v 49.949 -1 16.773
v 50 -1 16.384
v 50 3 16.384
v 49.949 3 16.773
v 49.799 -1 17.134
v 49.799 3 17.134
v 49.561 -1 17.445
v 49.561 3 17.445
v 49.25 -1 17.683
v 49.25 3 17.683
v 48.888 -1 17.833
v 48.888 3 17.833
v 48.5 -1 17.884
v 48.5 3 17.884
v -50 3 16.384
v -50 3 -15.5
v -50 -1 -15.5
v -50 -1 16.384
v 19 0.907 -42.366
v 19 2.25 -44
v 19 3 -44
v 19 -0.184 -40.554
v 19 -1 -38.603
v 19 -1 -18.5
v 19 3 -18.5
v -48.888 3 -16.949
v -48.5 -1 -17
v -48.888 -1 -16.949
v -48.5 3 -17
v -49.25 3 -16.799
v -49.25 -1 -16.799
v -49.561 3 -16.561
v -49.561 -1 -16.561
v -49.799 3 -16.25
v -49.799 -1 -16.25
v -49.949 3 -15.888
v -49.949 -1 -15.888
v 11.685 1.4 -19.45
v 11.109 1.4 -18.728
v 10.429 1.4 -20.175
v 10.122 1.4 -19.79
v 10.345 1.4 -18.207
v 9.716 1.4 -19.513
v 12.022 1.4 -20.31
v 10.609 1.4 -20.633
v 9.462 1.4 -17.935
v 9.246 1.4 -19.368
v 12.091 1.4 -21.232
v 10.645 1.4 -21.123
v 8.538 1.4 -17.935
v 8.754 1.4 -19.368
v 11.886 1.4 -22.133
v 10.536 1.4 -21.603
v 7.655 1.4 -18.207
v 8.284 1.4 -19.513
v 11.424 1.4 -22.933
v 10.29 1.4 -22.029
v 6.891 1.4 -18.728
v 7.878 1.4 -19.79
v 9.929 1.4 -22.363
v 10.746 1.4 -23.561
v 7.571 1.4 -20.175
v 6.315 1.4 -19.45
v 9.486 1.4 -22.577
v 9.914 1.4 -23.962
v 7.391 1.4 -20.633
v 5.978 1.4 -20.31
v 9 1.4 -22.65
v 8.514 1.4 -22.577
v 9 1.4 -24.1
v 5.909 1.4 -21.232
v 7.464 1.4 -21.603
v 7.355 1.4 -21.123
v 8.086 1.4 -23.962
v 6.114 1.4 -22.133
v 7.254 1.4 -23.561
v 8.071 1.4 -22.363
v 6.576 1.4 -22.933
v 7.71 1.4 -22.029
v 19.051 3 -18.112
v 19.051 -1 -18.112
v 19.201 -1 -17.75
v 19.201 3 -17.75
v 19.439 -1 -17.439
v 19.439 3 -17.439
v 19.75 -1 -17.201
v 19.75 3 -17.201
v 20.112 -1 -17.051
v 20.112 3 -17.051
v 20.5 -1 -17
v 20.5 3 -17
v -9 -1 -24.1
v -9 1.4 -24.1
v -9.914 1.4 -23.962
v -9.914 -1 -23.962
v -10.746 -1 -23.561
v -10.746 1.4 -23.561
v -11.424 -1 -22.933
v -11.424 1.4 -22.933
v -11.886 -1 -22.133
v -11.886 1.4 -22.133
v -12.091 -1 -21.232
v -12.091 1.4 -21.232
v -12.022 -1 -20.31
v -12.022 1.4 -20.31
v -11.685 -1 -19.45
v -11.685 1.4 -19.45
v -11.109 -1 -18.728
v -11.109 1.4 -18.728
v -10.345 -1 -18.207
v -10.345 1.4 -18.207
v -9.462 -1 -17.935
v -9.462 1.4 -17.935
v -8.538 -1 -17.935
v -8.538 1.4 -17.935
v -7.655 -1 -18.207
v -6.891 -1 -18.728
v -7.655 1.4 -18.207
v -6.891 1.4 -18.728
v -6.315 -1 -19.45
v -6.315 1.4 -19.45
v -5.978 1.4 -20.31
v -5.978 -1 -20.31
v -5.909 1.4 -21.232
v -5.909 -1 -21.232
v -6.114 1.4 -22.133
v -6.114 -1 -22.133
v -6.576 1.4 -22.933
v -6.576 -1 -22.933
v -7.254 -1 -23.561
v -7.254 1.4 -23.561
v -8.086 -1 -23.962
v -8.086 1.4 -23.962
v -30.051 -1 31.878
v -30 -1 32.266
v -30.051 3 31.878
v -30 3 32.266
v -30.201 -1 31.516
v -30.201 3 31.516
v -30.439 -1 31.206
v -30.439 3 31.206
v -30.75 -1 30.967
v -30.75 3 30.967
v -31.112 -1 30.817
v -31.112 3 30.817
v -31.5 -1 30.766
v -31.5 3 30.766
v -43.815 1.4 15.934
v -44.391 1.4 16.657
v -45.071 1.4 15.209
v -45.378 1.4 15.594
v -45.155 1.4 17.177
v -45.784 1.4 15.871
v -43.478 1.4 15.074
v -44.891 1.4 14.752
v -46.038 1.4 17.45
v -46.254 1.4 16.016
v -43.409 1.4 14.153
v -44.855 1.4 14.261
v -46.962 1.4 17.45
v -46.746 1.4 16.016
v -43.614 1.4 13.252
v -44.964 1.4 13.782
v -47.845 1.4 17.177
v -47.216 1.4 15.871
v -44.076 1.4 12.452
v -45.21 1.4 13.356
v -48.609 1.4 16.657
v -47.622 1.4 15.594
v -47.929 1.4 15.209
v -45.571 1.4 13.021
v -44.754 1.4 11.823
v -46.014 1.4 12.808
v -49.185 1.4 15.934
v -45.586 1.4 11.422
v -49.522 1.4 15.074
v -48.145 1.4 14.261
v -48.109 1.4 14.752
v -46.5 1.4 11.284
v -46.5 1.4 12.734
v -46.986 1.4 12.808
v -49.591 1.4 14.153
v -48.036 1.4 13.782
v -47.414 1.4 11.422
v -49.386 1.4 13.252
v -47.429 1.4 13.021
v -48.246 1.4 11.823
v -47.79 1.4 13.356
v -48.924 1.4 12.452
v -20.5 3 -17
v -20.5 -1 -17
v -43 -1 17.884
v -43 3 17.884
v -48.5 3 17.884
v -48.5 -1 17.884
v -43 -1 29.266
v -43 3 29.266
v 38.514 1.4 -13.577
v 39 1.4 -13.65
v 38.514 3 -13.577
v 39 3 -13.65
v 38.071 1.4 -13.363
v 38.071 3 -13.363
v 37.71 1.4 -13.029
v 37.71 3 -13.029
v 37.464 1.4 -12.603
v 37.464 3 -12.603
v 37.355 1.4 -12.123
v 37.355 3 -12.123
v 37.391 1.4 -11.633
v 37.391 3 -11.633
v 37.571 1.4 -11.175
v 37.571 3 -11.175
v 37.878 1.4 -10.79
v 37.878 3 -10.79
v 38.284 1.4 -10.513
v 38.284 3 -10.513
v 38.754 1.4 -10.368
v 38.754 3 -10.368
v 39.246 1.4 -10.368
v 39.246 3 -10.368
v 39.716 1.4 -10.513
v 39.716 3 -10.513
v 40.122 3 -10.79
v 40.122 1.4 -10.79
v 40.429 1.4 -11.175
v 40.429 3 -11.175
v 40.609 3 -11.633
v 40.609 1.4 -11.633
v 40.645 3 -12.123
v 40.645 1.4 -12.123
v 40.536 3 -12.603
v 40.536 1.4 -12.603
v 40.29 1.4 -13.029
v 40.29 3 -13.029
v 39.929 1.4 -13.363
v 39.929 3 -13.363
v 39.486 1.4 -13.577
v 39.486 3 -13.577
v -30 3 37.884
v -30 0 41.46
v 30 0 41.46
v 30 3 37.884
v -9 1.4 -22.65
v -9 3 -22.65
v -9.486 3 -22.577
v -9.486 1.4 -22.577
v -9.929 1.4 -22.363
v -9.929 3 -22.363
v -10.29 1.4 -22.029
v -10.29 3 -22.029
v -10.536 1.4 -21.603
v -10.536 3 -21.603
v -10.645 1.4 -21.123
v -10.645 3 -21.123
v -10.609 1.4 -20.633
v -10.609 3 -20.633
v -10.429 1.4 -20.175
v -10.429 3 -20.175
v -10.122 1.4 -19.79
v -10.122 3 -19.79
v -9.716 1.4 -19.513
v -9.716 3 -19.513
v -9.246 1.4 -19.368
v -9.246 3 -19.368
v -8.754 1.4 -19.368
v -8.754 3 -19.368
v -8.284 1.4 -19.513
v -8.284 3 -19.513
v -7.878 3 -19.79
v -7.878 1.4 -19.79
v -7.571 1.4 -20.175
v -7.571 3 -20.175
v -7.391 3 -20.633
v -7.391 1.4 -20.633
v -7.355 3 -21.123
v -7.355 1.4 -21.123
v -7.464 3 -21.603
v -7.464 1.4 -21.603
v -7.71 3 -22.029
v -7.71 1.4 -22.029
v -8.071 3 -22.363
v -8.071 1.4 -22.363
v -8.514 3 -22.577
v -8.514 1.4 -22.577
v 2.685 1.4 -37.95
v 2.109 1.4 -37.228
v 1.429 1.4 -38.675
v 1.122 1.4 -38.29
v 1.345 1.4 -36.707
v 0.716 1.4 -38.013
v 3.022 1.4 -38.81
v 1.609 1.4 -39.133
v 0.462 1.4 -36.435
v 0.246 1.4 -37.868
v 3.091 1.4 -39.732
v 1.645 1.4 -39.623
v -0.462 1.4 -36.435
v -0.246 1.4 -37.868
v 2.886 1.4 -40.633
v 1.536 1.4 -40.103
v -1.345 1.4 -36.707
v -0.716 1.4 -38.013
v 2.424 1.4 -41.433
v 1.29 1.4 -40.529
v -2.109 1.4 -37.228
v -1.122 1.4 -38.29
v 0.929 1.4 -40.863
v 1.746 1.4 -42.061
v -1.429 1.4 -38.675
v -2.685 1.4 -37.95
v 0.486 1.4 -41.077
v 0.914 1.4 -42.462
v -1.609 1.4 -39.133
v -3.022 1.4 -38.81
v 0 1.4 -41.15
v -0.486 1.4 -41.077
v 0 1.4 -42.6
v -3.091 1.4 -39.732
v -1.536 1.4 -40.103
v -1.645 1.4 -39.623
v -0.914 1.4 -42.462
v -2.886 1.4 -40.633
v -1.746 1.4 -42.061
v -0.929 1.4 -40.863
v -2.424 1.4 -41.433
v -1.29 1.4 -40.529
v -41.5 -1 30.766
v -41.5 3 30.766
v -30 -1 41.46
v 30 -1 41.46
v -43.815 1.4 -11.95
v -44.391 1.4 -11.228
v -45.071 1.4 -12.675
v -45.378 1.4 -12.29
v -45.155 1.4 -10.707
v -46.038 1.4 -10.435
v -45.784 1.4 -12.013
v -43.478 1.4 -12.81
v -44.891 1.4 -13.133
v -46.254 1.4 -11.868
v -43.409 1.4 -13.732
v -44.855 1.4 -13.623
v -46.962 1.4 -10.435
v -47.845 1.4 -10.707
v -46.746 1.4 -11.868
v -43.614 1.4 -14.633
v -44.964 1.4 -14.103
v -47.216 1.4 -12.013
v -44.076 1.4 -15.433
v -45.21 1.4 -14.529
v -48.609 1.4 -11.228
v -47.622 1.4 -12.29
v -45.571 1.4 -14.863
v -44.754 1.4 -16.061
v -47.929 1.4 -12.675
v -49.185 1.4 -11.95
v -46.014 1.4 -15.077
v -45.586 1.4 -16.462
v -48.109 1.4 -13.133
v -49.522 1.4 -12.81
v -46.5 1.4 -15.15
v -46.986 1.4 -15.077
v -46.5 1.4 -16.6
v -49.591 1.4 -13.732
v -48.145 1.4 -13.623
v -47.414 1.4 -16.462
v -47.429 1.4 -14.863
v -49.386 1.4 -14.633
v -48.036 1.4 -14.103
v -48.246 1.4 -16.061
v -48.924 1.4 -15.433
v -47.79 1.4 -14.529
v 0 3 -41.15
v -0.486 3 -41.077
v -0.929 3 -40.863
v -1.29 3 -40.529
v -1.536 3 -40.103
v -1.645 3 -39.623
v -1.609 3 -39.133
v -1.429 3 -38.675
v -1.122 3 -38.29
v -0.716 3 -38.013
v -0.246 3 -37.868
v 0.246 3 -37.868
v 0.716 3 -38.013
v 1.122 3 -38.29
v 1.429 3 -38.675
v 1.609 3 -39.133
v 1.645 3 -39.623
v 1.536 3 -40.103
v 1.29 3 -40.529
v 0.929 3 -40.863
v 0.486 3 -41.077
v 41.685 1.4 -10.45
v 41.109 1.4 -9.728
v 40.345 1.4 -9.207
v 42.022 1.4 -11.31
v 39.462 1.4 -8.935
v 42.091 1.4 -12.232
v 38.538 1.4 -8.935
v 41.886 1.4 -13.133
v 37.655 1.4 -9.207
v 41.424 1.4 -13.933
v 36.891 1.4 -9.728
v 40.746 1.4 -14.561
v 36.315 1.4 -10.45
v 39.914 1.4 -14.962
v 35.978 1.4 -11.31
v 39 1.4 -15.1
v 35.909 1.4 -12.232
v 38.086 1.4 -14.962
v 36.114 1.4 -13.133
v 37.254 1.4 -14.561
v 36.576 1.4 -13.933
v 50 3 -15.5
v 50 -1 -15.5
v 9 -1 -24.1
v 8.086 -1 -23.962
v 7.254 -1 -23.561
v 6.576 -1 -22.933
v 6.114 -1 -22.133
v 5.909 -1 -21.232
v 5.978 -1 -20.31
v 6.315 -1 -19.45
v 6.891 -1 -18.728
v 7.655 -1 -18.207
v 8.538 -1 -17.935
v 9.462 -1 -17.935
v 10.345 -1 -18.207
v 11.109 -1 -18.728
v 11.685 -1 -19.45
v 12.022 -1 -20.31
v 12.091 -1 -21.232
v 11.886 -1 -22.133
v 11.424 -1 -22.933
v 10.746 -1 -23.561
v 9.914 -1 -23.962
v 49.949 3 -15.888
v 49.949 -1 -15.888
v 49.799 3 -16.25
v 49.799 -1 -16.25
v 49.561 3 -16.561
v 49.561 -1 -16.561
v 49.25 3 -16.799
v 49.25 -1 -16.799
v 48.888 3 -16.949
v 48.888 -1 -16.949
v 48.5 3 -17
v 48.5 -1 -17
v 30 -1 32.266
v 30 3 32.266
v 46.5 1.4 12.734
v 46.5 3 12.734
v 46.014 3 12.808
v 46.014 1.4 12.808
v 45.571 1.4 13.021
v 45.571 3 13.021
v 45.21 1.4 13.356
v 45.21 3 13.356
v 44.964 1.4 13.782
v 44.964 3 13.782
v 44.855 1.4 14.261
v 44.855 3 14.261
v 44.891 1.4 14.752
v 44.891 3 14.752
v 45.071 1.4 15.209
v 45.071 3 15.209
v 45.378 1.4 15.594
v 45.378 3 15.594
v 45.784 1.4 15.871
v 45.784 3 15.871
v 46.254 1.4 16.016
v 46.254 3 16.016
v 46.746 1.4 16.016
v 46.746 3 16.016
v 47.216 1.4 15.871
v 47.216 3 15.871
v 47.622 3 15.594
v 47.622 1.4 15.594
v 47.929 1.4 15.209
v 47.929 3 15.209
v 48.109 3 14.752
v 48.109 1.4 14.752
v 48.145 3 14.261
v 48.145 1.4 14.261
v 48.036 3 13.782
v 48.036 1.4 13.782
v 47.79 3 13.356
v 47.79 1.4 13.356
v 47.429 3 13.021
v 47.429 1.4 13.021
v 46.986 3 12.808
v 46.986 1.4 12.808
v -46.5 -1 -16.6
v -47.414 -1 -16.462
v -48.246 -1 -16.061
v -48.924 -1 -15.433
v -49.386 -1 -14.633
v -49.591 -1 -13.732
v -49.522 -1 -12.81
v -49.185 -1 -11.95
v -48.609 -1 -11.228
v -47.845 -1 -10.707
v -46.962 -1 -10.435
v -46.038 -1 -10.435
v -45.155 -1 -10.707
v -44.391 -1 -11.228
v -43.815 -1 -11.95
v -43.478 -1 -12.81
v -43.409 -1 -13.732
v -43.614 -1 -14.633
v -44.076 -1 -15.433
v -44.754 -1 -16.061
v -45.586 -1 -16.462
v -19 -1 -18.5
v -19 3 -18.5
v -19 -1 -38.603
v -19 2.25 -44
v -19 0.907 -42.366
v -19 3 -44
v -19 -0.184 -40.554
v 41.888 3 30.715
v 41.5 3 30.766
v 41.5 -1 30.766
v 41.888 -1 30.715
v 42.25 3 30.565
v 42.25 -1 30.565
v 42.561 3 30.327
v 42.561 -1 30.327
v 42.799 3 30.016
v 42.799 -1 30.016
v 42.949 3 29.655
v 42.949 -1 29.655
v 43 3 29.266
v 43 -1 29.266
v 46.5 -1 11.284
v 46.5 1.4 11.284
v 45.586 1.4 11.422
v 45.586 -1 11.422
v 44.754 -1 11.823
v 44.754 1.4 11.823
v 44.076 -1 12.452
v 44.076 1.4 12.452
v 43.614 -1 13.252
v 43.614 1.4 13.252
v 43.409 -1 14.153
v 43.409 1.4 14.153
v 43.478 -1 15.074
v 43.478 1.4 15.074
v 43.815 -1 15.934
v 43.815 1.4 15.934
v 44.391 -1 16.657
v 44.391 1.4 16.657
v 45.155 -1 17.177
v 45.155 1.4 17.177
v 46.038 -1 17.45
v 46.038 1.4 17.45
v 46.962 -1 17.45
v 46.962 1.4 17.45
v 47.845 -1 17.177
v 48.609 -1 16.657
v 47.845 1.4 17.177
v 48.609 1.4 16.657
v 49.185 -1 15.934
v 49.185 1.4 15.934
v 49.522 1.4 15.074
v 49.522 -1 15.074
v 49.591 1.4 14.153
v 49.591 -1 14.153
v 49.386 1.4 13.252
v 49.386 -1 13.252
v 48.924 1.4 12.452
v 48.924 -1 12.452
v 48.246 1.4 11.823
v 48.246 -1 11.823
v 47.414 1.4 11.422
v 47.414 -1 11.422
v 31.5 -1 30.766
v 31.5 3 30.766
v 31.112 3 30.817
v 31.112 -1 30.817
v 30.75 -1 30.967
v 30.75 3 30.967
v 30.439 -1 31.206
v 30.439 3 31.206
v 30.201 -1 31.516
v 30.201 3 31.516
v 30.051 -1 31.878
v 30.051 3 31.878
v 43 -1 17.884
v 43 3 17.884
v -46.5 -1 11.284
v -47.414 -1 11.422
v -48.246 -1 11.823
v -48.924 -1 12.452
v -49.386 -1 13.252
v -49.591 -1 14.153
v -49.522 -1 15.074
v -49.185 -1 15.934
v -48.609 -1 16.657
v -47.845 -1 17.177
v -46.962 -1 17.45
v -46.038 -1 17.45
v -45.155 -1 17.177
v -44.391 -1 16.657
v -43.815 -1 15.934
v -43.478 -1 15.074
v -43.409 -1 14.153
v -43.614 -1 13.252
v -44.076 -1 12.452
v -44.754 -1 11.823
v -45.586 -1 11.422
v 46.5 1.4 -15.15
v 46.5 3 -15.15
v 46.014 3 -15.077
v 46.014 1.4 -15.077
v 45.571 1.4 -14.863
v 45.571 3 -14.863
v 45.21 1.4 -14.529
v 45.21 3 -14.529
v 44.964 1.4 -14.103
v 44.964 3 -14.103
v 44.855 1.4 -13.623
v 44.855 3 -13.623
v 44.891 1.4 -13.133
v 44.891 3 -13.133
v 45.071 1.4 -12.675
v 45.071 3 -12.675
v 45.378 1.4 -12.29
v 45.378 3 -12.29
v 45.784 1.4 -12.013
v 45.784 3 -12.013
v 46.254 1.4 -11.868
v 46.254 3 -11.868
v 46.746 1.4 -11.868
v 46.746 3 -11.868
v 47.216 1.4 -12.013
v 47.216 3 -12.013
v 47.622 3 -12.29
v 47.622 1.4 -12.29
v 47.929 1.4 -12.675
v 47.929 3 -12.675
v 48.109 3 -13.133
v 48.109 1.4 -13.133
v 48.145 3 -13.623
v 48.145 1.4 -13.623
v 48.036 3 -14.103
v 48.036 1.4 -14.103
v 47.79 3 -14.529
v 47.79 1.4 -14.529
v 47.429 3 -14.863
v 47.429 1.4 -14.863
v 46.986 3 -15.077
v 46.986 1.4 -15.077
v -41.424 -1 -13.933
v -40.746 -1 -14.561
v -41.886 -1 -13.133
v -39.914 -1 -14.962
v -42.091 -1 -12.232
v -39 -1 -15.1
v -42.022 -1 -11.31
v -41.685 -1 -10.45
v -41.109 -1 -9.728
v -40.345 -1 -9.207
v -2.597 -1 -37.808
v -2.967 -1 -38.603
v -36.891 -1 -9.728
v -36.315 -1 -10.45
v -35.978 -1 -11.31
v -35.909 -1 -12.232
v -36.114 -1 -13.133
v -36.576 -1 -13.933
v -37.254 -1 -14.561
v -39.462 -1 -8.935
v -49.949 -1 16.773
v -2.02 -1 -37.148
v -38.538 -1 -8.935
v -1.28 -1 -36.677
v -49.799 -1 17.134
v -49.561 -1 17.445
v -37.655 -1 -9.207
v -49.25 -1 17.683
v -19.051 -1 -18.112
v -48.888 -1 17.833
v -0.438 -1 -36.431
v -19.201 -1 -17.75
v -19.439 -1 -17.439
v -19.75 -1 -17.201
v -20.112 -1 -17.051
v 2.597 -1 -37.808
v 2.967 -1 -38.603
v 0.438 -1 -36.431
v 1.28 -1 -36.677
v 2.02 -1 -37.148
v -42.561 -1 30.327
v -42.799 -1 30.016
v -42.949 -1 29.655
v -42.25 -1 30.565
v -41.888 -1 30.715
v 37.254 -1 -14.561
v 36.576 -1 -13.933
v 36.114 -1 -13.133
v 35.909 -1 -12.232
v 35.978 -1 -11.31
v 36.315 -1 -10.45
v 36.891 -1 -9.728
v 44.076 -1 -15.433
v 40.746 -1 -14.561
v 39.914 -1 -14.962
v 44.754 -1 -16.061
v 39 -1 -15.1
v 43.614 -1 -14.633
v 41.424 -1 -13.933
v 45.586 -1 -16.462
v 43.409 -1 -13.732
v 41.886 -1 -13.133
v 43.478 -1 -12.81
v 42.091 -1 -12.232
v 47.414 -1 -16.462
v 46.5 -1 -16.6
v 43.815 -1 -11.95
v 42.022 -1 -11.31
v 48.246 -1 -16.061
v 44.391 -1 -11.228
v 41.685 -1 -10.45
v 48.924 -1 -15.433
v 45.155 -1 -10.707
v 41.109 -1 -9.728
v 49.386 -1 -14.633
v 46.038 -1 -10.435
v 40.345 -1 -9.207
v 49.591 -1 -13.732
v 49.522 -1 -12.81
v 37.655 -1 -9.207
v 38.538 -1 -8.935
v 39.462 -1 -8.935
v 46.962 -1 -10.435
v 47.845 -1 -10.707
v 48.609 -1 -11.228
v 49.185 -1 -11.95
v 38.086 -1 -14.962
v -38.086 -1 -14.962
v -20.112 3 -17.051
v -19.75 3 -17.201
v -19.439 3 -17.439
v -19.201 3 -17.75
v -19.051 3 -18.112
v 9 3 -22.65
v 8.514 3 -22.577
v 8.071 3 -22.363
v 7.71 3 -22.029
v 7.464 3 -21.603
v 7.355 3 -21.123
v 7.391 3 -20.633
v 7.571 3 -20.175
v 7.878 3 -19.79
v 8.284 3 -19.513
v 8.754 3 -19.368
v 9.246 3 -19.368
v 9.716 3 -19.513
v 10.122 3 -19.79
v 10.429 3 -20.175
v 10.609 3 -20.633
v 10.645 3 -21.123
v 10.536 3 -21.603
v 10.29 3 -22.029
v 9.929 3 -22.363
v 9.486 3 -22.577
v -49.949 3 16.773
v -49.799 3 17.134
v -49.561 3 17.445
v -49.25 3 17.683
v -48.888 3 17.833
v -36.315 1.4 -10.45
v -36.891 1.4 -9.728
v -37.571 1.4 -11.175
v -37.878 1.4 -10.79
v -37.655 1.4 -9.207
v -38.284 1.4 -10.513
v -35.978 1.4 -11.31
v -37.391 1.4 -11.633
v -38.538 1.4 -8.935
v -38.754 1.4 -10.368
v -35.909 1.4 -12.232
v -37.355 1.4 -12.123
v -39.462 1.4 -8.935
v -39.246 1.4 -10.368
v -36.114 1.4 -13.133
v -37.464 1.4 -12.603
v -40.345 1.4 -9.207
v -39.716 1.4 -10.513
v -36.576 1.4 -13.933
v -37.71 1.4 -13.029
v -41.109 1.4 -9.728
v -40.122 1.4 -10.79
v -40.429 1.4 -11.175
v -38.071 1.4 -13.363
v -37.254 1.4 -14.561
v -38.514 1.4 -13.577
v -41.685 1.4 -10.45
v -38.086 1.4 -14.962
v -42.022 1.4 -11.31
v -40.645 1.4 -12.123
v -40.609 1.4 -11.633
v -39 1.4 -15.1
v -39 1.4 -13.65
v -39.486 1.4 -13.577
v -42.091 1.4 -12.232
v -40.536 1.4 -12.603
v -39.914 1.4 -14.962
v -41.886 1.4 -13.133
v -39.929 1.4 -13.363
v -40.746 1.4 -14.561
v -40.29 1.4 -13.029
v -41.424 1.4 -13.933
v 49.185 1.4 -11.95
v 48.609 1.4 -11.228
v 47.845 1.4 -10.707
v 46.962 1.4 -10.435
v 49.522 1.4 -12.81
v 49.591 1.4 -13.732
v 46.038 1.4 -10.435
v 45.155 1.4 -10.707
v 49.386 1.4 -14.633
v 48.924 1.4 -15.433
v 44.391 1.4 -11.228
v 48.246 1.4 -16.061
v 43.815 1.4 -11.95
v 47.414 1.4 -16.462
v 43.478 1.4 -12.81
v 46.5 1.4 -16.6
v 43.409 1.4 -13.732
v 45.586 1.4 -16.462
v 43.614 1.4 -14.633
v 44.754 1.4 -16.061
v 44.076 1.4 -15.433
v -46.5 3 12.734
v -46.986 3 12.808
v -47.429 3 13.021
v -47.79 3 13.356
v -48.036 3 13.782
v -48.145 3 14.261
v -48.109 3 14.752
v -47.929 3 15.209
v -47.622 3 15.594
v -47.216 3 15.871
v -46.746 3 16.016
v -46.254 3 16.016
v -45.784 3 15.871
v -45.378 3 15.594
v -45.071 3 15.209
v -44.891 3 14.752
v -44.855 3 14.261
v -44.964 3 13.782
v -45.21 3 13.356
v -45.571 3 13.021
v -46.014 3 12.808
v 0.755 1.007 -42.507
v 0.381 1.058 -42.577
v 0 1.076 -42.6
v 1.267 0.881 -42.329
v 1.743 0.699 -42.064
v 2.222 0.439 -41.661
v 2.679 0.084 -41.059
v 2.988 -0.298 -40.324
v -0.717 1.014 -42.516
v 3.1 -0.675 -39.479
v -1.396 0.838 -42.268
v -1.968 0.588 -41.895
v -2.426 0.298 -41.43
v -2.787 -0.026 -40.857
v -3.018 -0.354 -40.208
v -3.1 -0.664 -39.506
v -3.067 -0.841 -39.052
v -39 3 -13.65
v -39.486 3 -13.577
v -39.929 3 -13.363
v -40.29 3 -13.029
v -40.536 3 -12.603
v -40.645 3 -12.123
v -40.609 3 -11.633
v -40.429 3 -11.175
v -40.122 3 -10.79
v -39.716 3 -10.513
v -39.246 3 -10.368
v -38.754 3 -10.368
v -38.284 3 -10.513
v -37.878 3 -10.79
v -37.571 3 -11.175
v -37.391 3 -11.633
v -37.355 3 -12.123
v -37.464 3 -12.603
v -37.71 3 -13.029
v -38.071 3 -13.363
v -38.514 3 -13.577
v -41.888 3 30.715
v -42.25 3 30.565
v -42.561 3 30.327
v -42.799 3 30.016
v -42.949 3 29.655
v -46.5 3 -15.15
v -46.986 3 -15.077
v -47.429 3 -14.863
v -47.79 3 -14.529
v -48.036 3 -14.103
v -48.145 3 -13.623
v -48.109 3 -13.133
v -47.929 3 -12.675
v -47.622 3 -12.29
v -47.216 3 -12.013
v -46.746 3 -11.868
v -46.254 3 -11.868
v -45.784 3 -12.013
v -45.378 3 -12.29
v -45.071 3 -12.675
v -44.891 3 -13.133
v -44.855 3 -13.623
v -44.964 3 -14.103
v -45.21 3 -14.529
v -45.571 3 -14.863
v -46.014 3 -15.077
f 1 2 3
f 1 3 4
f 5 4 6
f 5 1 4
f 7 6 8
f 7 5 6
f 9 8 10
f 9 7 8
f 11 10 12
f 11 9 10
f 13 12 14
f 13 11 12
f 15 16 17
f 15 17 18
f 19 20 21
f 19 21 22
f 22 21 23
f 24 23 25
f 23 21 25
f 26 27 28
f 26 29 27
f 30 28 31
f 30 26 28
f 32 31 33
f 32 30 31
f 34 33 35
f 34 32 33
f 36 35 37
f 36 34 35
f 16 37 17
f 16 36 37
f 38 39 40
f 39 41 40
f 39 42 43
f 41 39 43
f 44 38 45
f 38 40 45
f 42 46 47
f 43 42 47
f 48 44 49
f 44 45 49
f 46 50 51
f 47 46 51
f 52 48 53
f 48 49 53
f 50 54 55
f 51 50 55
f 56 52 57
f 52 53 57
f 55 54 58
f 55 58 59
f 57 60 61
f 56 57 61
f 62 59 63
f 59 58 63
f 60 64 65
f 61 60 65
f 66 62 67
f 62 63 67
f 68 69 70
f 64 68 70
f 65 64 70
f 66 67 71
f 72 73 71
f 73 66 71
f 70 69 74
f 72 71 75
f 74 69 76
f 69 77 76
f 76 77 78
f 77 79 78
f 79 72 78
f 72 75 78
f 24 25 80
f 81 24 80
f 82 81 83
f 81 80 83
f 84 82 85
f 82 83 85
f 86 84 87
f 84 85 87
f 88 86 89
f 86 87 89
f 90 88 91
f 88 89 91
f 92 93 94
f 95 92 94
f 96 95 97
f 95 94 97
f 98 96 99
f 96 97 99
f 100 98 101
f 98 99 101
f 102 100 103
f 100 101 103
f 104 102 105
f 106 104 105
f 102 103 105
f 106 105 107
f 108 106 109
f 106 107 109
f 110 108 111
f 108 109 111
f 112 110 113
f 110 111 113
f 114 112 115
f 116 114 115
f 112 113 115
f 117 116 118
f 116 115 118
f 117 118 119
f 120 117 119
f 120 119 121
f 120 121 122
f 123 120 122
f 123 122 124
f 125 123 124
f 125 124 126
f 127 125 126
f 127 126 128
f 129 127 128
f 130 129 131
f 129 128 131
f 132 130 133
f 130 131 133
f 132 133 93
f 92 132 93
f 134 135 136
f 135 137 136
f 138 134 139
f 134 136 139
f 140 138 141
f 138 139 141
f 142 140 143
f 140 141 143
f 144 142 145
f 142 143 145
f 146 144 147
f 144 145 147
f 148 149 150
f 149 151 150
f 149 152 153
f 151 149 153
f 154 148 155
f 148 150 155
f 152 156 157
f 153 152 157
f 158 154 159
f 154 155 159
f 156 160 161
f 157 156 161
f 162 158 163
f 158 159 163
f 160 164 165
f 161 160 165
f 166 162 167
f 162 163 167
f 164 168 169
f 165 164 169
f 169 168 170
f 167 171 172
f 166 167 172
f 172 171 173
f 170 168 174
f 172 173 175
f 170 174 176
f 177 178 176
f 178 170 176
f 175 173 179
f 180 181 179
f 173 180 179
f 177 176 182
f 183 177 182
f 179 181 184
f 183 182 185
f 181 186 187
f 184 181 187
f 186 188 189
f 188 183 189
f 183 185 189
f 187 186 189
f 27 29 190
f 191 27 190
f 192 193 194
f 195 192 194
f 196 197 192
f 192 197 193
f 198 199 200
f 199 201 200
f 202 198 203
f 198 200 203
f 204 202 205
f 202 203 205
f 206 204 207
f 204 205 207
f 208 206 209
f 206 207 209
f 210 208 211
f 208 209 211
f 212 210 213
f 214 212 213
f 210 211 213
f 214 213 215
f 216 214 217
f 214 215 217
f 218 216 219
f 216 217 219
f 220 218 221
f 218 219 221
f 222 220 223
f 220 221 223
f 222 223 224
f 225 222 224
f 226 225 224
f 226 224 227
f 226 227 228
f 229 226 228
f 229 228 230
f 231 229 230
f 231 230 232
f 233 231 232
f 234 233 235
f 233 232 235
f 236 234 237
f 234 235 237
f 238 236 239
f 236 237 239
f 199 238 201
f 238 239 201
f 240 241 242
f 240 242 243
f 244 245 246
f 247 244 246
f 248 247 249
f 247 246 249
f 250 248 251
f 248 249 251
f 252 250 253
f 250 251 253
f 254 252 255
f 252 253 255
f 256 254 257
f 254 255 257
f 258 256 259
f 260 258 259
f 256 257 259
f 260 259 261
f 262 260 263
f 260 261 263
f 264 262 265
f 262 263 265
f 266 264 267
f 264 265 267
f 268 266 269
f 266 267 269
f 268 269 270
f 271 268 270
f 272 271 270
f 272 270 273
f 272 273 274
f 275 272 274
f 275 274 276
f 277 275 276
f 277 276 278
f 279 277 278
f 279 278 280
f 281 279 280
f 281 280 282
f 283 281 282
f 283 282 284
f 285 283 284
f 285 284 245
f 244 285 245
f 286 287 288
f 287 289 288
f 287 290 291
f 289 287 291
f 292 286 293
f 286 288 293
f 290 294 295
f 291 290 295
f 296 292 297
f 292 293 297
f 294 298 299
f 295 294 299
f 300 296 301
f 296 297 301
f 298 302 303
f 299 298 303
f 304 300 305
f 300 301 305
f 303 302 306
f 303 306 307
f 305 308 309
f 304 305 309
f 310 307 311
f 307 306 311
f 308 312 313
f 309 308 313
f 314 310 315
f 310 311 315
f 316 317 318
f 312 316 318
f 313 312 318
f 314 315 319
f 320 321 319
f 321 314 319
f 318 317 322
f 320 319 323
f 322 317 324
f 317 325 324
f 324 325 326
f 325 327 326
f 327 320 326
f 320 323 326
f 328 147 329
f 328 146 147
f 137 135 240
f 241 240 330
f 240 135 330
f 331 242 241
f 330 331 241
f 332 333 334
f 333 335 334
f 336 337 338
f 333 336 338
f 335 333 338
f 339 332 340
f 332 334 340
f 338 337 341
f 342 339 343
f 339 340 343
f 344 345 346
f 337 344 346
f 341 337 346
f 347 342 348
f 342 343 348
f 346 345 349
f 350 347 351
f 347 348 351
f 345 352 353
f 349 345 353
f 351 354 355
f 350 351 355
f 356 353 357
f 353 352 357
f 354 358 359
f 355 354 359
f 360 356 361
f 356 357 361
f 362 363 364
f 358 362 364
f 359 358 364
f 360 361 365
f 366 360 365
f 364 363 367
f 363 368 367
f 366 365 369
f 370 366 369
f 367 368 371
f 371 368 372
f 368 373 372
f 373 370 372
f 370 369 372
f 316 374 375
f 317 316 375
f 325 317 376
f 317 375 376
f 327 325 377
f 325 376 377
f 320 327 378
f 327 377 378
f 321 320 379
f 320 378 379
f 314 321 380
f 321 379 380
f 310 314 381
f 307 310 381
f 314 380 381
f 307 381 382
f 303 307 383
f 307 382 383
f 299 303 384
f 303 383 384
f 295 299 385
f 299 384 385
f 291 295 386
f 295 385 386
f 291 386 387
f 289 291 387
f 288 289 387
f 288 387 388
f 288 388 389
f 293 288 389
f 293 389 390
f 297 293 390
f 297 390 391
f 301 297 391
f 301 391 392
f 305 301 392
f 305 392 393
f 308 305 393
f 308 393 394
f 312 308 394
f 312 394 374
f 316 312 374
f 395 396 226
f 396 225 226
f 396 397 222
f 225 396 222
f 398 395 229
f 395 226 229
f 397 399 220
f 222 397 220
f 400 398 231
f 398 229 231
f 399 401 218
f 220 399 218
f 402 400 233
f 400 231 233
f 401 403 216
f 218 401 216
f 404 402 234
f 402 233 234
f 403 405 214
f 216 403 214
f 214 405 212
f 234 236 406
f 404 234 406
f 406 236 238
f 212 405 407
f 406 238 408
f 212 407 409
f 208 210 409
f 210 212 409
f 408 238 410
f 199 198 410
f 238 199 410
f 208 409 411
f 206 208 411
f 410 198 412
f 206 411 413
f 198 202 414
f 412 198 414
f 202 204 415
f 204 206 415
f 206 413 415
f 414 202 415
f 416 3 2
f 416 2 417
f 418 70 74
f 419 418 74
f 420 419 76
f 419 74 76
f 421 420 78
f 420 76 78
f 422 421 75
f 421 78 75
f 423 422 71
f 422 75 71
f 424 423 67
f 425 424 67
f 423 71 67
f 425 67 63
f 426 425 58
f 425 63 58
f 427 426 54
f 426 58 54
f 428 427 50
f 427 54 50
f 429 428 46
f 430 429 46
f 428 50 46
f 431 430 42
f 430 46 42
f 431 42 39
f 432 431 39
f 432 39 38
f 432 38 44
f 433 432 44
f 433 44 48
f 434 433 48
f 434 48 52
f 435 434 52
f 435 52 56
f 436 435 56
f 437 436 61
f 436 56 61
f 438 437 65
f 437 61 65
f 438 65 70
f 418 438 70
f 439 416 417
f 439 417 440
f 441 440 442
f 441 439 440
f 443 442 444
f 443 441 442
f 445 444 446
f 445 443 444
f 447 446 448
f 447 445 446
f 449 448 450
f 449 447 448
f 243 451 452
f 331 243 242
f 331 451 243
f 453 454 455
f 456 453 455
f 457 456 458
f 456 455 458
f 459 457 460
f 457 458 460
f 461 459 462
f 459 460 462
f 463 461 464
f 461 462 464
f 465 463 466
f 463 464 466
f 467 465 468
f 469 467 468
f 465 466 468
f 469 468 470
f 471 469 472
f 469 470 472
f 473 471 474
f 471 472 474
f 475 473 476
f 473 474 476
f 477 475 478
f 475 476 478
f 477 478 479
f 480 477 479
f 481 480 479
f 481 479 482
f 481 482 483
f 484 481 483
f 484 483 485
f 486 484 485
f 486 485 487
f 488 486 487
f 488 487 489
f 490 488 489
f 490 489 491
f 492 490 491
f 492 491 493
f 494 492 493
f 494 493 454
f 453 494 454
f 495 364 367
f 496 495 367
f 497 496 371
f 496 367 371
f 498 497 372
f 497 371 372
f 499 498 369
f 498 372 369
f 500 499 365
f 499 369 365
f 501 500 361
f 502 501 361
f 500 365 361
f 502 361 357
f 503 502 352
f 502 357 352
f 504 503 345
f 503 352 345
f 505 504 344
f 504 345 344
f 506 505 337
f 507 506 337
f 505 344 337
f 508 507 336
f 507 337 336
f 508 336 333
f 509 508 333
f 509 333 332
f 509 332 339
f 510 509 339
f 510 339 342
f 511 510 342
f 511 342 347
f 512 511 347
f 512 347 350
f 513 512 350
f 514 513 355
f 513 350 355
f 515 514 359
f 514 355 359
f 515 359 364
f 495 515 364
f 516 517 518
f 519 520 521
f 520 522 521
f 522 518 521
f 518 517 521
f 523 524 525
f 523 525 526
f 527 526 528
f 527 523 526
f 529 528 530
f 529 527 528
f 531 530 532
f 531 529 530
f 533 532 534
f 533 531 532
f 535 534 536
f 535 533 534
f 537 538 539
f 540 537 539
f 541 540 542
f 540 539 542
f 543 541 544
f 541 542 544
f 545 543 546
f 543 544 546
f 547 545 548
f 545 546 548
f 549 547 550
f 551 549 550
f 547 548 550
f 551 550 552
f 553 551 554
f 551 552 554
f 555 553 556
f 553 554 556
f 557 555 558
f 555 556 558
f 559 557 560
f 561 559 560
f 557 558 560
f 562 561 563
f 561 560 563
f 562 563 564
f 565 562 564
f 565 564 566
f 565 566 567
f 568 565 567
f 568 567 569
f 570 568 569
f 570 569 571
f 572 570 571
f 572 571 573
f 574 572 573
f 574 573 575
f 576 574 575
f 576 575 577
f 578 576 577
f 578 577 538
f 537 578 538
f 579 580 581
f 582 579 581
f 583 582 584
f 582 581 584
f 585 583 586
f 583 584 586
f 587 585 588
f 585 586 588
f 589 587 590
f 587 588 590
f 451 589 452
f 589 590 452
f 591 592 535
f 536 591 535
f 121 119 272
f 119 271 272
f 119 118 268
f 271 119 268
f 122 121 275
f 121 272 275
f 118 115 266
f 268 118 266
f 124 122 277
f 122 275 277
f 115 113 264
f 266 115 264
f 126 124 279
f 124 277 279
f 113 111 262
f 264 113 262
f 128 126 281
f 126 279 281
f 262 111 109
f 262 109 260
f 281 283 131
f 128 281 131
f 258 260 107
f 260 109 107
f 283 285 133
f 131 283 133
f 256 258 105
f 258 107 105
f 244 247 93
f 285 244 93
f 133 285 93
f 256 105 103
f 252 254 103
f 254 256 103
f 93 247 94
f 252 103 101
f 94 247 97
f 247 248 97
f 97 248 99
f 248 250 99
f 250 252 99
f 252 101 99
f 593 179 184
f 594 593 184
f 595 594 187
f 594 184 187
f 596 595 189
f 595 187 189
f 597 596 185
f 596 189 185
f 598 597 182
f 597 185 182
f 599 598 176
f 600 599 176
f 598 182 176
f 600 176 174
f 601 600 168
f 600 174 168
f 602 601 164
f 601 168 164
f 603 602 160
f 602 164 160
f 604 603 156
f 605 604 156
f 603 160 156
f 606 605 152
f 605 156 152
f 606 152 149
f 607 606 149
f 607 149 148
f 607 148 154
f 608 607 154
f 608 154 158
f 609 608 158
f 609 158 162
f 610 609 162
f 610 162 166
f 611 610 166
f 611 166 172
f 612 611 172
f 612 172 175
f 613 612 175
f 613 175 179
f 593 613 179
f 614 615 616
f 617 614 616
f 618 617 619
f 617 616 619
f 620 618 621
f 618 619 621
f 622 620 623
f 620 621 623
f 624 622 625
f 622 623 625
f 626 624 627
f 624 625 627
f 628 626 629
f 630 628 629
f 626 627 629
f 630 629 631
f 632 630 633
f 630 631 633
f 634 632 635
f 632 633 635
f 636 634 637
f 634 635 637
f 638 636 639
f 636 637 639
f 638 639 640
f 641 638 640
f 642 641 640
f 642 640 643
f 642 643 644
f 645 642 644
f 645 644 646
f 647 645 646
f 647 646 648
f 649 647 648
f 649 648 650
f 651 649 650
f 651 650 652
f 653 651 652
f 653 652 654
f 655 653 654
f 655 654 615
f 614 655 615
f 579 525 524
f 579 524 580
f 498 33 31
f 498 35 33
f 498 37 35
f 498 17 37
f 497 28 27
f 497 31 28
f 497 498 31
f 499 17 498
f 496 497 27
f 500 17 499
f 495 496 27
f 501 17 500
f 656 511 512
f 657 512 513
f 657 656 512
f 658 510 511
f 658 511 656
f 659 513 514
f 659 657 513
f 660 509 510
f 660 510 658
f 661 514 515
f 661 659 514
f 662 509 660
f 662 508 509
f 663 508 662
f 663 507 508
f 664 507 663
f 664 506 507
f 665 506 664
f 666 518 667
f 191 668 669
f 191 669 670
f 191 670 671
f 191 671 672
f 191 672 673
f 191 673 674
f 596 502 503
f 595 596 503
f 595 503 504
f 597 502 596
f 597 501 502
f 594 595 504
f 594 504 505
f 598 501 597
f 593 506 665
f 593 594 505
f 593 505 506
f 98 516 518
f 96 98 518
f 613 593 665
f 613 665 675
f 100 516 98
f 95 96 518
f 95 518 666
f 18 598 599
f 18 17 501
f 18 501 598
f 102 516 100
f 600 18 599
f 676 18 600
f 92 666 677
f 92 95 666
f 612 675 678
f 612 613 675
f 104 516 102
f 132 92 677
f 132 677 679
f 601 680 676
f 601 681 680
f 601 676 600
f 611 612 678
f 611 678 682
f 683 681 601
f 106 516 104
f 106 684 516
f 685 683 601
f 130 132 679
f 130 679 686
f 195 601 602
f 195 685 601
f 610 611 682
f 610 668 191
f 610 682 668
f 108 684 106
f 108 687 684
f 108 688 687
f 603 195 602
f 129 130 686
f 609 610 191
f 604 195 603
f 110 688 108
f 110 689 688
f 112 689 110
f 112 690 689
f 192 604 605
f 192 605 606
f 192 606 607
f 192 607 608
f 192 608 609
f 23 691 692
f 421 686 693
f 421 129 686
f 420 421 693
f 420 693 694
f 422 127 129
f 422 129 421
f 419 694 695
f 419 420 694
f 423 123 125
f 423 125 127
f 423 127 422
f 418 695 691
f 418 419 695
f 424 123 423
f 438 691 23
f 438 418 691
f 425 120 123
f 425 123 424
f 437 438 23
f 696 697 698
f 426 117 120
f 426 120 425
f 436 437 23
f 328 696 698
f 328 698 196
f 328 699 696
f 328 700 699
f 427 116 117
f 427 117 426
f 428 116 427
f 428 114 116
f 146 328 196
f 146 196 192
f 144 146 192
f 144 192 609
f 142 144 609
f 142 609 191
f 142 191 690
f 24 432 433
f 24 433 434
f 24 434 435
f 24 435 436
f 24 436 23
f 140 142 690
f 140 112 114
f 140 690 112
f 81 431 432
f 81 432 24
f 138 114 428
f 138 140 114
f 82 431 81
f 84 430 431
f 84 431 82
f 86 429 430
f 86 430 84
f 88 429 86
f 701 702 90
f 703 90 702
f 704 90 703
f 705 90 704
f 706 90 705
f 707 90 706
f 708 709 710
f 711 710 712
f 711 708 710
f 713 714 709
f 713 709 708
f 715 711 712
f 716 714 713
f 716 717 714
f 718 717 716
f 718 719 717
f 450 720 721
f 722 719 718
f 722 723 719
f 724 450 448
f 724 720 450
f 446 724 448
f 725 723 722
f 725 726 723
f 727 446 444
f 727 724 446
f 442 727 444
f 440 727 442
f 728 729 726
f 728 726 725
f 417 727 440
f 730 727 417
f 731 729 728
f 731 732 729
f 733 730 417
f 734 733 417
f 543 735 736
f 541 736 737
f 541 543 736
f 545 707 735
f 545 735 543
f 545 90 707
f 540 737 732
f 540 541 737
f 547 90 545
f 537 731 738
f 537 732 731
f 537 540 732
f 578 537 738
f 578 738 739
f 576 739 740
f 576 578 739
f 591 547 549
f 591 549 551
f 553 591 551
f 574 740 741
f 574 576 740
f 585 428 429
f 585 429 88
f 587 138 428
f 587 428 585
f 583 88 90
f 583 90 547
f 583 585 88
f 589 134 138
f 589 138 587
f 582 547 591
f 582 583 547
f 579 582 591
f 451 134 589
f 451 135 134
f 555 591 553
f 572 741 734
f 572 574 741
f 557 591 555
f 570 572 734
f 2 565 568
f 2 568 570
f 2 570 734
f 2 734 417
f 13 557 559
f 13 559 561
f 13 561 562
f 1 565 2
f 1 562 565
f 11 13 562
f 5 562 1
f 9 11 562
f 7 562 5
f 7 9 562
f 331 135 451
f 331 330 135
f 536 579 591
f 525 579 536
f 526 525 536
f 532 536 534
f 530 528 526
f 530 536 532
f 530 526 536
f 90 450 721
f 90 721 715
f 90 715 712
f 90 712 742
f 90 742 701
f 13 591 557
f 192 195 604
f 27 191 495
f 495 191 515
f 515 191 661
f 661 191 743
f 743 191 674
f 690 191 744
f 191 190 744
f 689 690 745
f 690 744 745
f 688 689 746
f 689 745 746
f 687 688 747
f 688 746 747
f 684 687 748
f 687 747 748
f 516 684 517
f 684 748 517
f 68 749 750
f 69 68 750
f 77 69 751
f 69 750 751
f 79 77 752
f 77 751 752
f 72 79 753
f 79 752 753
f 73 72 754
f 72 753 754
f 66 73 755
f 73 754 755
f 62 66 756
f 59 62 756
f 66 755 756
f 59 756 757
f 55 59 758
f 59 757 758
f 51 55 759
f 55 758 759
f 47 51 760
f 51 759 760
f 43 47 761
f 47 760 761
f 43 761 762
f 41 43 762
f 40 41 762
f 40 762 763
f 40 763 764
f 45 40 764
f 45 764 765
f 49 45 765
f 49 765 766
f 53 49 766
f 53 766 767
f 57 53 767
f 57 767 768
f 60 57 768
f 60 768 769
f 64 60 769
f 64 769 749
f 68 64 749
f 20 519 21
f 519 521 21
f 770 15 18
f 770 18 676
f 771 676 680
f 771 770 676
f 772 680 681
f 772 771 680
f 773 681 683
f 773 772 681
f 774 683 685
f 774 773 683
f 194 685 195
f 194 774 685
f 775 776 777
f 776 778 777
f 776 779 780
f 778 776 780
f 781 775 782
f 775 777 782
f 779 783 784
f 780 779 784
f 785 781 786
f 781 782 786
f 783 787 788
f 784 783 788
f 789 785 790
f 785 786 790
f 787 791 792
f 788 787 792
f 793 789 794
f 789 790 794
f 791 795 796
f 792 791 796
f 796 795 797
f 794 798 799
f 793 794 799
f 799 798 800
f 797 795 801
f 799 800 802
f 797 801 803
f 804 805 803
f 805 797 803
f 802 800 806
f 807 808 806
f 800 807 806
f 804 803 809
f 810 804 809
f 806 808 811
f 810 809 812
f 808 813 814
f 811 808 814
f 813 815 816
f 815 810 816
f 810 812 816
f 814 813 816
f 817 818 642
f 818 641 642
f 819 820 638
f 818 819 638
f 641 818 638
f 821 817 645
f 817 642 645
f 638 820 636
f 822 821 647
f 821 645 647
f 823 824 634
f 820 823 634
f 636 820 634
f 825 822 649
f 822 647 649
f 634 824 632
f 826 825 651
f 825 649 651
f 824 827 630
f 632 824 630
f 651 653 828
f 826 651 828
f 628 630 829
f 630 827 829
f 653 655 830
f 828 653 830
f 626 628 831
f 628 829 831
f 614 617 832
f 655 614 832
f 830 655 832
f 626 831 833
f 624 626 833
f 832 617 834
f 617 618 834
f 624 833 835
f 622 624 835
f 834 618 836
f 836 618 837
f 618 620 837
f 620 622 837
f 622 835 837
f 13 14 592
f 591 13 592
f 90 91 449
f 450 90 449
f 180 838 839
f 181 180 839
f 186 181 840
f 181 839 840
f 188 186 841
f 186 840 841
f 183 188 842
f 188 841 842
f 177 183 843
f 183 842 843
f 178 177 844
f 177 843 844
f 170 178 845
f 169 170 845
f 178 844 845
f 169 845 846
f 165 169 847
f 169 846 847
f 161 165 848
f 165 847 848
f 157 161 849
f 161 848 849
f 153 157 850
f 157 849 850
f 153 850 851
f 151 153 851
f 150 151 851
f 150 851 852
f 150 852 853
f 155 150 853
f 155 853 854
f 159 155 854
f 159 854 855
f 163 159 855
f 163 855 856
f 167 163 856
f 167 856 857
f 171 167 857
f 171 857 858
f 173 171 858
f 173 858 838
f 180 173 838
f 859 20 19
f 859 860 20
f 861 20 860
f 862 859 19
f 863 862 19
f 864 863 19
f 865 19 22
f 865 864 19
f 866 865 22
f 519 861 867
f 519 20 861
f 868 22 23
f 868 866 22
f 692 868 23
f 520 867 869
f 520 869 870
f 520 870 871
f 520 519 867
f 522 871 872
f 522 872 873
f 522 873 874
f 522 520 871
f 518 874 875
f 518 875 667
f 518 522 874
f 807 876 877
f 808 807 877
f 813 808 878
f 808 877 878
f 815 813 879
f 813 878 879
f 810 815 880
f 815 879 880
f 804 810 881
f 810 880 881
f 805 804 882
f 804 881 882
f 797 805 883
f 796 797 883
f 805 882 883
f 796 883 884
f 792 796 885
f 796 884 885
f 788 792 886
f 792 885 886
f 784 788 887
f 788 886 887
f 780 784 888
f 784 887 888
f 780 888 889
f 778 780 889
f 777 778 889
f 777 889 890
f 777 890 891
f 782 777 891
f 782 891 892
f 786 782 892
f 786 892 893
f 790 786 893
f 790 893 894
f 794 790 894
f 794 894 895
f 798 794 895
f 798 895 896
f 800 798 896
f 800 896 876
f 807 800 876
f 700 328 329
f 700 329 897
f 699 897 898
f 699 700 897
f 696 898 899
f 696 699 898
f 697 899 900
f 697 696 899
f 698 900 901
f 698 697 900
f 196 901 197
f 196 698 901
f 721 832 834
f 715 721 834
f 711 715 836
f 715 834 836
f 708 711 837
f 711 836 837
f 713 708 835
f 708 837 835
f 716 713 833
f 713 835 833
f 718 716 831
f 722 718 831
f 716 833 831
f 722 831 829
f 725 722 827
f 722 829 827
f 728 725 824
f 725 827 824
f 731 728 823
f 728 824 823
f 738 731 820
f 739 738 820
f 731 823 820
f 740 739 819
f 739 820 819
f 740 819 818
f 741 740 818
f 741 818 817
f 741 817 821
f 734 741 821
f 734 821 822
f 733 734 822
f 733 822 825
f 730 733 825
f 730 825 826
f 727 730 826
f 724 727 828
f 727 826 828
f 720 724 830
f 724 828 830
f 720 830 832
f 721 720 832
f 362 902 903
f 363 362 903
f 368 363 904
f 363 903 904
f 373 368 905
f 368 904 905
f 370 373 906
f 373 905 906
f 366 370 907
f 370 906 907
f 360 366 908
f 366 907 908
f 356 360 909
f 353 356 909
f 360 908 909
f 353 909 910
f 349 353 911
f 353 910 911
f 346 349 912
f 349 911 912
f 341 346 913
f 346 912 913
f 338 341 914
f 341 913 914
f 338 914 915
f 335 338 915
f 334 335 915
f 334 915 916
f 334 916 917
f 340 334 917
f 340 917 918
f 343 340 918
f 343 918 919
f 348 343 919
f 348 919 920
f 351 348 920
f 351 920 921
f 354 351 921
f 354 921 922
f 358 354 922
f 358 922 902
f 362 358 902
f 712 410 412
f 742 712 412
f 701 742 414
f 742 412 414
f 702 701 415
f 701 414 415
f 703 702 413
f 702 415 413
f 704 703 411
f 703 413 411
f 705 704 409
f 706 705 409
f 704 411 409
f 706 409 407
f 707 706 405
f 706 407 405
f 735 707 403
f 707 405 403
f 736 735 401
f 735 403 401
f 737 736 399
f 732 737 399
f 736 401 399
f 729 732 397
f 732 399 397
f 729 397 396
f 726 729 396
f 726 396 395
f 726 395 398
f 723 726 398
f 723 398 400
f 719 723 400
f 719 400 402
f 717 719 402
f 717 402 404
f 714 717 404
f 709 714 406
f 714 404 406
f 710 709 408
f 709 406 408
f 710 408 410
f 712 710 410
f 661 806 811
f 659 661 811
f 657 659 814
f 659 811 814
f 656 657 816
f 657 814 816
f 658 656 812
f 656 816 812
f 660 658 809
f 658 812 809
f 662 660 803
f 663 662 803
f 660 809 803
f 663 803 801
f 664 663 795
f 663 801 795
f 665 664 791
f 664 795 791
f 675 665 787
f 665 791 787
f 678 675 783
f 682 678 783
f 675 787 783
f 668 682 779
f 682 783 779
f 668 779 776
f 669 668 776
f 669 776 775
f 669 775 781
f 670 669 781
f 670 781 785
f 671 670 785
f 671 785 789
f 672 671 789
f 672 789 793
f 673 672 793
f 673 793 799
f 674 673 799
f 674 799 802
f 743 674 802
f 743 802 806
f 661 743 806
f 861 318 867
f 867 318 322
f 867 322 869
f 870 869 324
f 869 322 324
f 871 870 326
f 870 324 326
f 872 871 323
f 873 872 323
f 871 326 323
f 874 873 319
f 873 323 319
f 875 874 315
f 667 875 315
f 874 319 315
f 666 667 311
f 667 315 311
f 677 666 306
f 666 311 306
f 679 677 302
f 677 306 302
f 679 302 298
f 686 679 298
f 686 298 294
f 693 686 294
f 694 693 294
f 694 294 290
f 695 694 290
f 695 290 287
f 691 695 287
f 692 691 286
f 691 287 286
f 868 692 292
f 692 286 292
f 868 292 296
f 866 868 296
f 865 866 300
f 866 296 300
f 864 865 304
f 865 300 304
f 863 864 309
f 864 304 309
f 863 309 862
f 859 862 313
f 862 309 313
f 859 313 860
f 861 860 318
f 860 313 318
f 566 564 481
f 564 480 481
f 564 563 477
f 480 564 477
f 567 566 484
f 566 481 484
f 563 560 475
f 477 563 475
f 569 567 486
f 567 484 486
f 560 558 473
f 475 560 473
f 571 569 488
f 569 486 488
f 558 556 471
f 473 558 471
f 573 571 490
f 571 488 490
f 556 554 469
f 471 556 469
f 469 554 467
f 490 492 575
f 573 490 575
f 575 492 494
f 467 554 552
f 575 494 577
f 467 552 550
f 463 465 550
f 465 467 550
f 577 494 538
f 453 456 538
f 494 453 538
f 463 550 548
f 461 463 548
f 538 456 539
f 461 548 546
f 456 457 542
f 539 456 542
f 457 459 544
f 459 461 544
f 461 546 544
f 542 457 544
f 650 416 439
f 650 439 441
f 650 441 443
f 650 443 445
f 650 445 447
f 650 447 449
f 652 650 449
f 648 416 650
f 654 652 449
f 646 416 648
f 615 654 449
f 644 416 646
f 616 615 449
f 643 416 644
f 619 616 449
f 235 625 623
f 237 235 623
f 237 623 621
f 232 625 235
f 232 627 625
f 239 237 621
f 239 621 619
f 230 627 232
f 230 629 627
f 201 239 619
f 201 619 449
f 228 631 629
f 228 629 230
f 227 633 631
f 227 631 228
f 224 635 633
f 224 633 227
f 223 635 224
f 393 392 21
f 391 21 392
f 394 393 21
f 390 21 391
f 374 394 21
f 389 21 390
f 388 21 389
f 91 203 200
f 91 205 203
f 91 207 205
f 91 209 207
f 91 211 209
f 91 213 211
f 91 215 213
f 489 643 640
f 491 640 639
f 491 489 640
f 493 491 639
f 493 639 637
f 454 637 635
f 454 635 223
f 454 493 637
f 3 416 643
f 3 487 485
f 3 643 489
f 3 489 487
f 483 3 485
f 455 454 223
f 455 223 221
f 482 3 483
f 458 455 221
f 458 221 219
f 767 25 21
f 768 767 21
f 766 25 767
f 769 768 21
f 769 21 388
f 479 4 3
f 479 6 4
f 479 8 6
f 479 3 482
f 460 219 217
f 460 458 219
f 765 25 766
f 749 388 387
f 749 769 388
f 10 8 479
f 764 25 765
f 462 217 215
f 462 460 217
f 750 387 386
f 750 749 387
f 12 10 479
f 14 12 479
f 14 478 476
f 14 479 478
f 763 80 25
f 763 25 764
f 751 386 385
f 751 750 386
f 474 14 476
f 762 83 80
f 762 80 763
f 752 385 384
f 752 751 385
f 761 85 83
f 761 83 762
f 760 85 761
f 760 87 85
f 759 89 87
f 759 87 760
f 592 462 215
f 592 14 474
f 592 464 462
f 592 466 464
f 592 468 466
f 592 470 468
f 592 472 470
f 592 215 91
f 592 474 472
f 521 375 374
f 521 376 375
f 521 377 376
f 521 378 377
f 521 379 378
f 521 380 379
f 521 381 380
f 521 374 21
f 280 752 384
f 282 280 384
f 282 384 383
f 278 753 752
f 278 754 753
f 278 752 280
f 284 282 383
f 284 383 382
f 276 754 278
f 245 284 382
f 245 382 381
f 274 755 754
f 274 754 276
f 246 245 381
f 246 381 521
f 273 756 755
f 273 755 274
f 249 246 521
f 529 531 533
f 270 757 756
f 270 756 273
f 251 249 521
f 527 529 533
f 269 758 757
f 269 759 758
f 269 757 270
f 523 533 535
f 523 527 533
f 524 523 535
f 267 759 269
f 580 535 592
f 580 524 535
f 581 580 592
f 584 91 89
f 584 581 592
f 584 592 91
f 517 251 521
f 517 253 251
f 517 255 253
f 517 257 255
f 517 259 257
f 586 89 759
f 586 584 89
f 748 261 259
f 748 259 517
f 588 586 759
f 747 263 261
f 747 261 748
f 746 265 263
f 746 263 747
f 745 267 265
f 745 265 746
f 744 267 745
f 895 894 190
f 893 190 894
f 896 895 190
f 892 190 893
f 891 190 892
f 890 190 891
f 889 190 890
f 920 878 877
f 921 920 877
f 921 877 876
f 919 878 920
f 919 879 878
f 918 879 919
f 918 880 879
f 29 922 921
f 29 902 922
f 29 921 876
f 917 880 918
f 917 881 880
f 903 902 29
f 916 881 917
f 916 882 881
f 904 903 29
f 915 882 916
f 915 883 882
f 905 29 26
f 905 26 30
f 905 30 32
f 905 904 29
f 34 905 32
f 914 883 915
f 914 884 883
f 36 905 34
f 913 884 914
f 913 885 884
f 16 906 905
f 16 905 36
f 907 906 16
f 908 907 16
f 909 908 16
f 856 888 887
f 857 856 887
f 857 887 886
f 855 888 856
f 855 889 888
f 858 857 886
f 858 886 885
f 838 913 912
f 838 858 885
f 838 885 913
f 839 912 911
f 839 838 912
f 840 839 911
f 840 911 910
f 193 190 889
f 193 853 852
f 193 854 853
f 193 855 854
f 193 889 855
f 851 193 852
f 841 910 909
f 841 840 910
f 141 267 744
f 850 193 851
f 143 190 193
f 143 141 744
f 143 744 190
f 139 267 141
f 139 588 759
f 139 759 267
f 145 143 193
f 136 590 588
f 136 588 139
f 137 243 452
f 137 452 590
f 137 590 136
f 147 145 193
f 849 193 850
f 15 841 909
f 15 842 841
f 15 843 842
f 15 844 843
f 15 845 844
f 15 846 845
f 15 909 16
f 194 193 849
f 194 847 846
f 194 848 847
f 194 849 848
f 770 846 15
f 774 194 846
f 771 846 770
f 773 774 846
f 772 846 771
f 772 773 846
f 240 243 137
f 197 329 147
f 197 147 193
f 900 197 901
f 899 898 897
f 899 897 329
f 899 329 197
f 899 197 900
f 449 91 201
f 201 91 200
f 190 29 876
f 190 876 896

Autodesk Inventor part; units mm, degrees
ref_plane "YZ Plane" through (0, 0, 0) normal (1, 0, 0) x (0, 1, 0)
ref_plane "XZ Plane" through (0, 0, 0) normal (0, 1, 0) x (-1, 0, 0)
ref_plane "XY Plane" through (0, 0, 0) normal (0, 0, 1) x (1, 0, 0)
sketch "Szkic1" plane through (0, 0, 0) normal (0, 1, 0) x (-1, 0, 0)
  line L0 (50, 50) -> (-50, 50)
  line L1 (-50, 50) -> (-50, -50)
  line L2 (-50, -50) -> (50, -50)
  line L3 (50, -50) -> (50, 50)
  line L4 (50, 50) -> (-50, -50) construction
  line L5 (-50, 50) -> (50, -50) construction
  point P0 (0, 0)
  dimension "d0" = 100
  dimension "d1" = 100
extrude "Wyciągnięcie proste1" add sketch "Szkic1" along normal blind 3
sketch "Szkic2" plane through (0, 3, 0) normal (0, 1, 0) x (1, 0, 0)
  line L0 (50, -50) -> (50, 50) projected
  line L1 (50, 50) -> (-50, 50) projected
  line L2 (-50, 50) -> (-50, -50) projected
  line L3 (-50, -50) -> (50, -50) projected
  line L4 (-50, 50) -> (-19, 50)
  line L5 (-19, 50) -> (-19, 17)
  line L6 (-19, 17) -> (-50, 17)
  line L7 (-50, 17) -> (-50, 50)
  line L8 (50, 50) -> (19, 50)
  line L9 (19, 50) -> (19, 17)
  line L10 (19, 17) -> (50, 17)
  line L11 (50, 17) -> (50, 50)
  point P0 (0, 0)
  dimension "d4" = 31
  dimension "d5" = 33
  dimension "d6" = 31
extrude "Wyciągnięcie proste2" cut sketch "Szkic2" against normal through all contours L10 L9 L1 L0 | L2 L1 L5 L6
sketch "Szkic3" plane through (0, 3, 0) normal (0, 1, 0) x (1, 0, 0)
  line L0 (19, 17) -> (19, 50) projected
  line L1 (19, 50) -> (-19, 50) projected
  line L2 (-19, 50) -> (-19, 17) projected
  line L3 (-19, 17) -> (-50, 17) projected
  line L4 (-50, 17) -> (-50, -50) projected
  line L5 (-50, -50) -> (50, -50) projected
  line L6 (50, -50) -> (50, 17) projected
  line L7 (50, 17) -> (19, 17) projected
  line L8 (19, 50) -> (-19, 50)
  line L9 (-19, 50) -> (-19, 44)
  line L10 (-19, 44) -> (19, 44)
  line L11 (19, 44) -> (19, 50)
  point P0 (0, 0)
  dimension "d9" = 6
extrude "Wyciągnięcie proste3" cut sketch "Szkic3" against normal through all contours L10 L2 L1 L0
sketch "Szkic5" plane through (-50, 0, 50) normal (-1, 0, 0) x (0, 0, 1)
  line L0 (0, 0) -> (0, 3) projected
  line L1 (-67, 3) -> (-67, 0) projected
  line L2 (-67, 0) -> (0, 0) projected
  line L3 (0, 0) -> (0, 3) projected
  line L4 (-67, 3) -> (0, 3) projected
  line L5 (-4.6672, -3.25) -> (-21.0795, 10.5216) projected
  point P0 (-50, 0)
  point P1 (-12.1156, 3)
  point P2 (-8.5404, 0)
extrude "Wyciągnięcie proste5" cut sketch "Szkic5" against normal through all contours L2 L5 L4 L0
sketch "Szkic6" plane through (0, 0, 0) normal (0, -1, 0) x (1, 0, 0)
  line L0 (-50, 17.8844) -> (-43, 17.8844) projected
  line L1 (-50, 17.8844) -> (-43, 17.8844)
  line L2 (-43, 17.8844) -> (-43, 43.0531)
  line L3 (-43, 43.0531) -> (-50, 43.0531)
  line L4 (-50, 43.0531) -> (-50, 17.8844)
  point P0 (0, 0)
extrude "Wyciągnięcie proste6" cut sketch "Szkic6" against normal through all
ref_plane "Płaszczyzna konstrukcyjna1" through (0, 0, -17) normal (-1, 0, 0) x (0, 0, 1)
mirror "Odbij1" about plane through (0, 0, -17) normal (-1, 0, 0) of "Wyciągnięcie proste6"
sketch "Szkic8" plane through (0, 0, 0) normal (0, -1, 0) x (1, 0, 0)
  line L0 (50, 17.8844) -> (43, 17.8844) projected
  line L1 (43, 17.8844) -> (43, 41.4596) projected
  line L2 (43, 41.4596) -> (-43, 41.4596) projected
  line L3 (-43, 41.4596) -> (-43, 17.8844) projected
  line L4 (-43, 17.8844) -> (-50, 17.8844) projected
  line L5 (-50, -17) -> (-50, 17.8844) projected
  line L6 (-50, -17) -> (-19, -17) projected
  line L7 (-19, -17) -> (-19, -44) projected
  line L8 (-19, -44) -> (19, -44) projected
  line L9 (19, -44) -> (19, -17) projected
  line L10 (19, -17) -> (50, -17) projected
  line L11 (50, 17.8844) -> (50, -17) projected
  point P0 (0, 0)
extrude "Wyciągnięcie proste7" add sketch "Szkic8" along normal blind 1
sketch "Szkic9" plane through (-19, 3, -44) normal (-1, 0, 0) x (0, 0, 1)
  circle A0 centre (10, 9.75) radius 16 projected
  circle A1 centre (10, 9.75) radius 14.5
  line L0 (0, 0) -> (0, -4) projected
  line L1 (27, -4) -> (0, -4) projected
  line L2 (27, 0) -> (27, -4) projected
  line L3 (0, 0) -> (27, 0) projected
  point P0 (44, -3)
  point P1 (5.397, -4)
  point P2 (0, -0.75)
  dimension "d21" = 1.5
extrude "Wyciągnięcie proste8" cut sketch "Szkic9" against normal through all contours L0 A1 L1 A0 | A0 L1 L0
sketch "Szkic10" plane through (0, -1, 0) normal (0, -1, 0) x (1, 0, 0)
  point P0 (0, 0)
sketch "Szkic11" plane through (0, -1, 0) normal (0, -1, 0) x (1, 0, 0)
  circle A0 centre (0, -39.5) radius 1.7 projected
  circle A1 centre (-9, -21) radius 1.7 projected
  circle A2 centre (9, -21) radius 1.7 projected
  arc A3 (46.5, -10) -> (43, -13.5) centre (46.5, -13.5) ccw projected
  arc A4 (43, 14.3844) -> (47, 10.9203) centre (46.5, 14.3844) ccw projected
  arc A5 (-43, -13.5) -> (-46.5, -10) centre (-46.5, -13.5) ccw projected
  arc A6 (-47, 10.9203) -> (-43, 14.3844) centre (-46.5, 14.3844) ccw projected
  circle A7 centre (-39, -12) radius 1.55 projected
  circle A8 centre (39, -12) radius 1.55 projected
  point P0 (0, 0)
hole "Otwór1" at (-39, -1, -12) at (-46.5, -1, -13.5) at (-46.5, -1, 14.3844) at (-9, -1, -21) at (0, -1, -39.5) at (9, -1, -21) at (39, -1, -12) at (46.5, -1, -13.5) at (46.5, -1, 14.3844) direction (0, 1, 0) diameter 3.3 end through all counterbore diameter 6.2 counterbore depth 2.4
sketch "Szkic12" plane through (0, -1, 0) normal (0, -1, 0) x (1, 0, 0)
  arc A0 (2.9674, -38.603) -> (-2.9674, -38.603) centre (0, -39.5) ccw projected
  line L0 (2.9674, -38.603) -> (19, -38.603) projected
  line L1 (19, -38.603) -> (19, -17) projected
  line L2 (19, -17) -> (50, -17) projected
  line L3 (50, -17) -> (50, 17.8844) projected
  line L4 (50, 17.8844) -> (43, 17.8844) projected
  line L5 (43, 17.8844) -> (43, 41.4596) projected
  line L6 (43, 41.4596) -> (-43, 41.4596) projected
  line L7 (-43, 41.4596) -> (-43, 17.8844) projected
  line L8 (-43, 17.8844) -> (-50, 17.8844) projected
  line L9 (-50, 17.8844) -> (-50, -17) projected
  line L10 (-50, -17) -> (-19, -17) projected
  line L11 (-19, -17) -> (-19, -38.603) projected
  line L12 (-19, -38.603) -> (-2.9674, -38.603) projected
  circle A1 centre (46.5, 14.3844) radius 3.1 projected
  circle A2 centre (39, -12) radius 3.1 projected
  circle A3 centre (-46.5, 14.3844) radius 3.1 projected
  circle A4 centre (-39, -12) radius 3.1 projected
  circle A5 centre (-46.5, -13.5) radius 3.1 projected
  circle A6 centre (-9, -21) radius 3.1 projected
  circle A7 centre (9, -21) radius 3.1 projected
  circle A8 centre (46.5, -13.5) radius 3.1 projected
  line L13 (-50, 30.7663) -> (-50, 40.7446) projected
  line L14 (-43, 30.7663) -> (-50, 30.7663) projected
  line L15 (-43, 40.7446) -> (-43, 30.7663) projected
  line L16 (-43, 40.7446) -> (-50, 40.7446) projected
  line L17 (-50, 30.7663) -> (-30, 30.7663)
  line L18 (-30, 30.7663) -> (-30, 41.4596)
  line L19 (-30, 41.4596) -> (-50, 41.4596)
  line L20 (-50, 41.4596) -> (-50, 30.7663)
  line L21 (50, 30.7663) -> (50, 40.7446) projected
  line L22 (43, 40.7446) -> (50, 40.7446) projected
  line L23 (43, 40.7446) -> (43, 30.7663) projected
  line L24 (43, 30.7663) -> (50, 30.7663) projected
  line L25 (50, 30.7663) -> (30, 30.7663)
  line L26 (30, 30.7663) -> (30, 41.4596)
  line L27 (30, 41.4596) -> (50, 41.4596)
  line L28 (50, 41.4596) -> (50, 30.7663)
  circle A9 centre (46.1444, 33.7663) radius 1.1 projected
  circle A10 centre (-46.1444, 33.7663) radius 1.1 projected
  point P0 (0, 0)
  dimension "d31" = 20
  dimension "d32" = 20
extrude "Wyciągnięcie proste9" cut sketch "Szkic12" against normal through all contours L25 L26 L6 L5 | L5 L22 L21 L24 | L14 L13 L16 L7 | L7 L6 L18 L17 | L5 L27 L28 L22 | L16 L20 L19 L7 | A9 | A10
fillet "Zaokrąglenie2" radius 1.5 10 edges at (-50, 1, 17.8844) (-50, 1, -17) (-19, 1, -17) (19, 1, -17) (50, 1, -17) (50, 1, 17.8844) (43, 1, 30.7663) (30, 1, 30.7663) (-43, 1, 30.7663) (-30, 1, 30.7663)
properties part number "podstawa_kopia" material "Stal, odlew"
